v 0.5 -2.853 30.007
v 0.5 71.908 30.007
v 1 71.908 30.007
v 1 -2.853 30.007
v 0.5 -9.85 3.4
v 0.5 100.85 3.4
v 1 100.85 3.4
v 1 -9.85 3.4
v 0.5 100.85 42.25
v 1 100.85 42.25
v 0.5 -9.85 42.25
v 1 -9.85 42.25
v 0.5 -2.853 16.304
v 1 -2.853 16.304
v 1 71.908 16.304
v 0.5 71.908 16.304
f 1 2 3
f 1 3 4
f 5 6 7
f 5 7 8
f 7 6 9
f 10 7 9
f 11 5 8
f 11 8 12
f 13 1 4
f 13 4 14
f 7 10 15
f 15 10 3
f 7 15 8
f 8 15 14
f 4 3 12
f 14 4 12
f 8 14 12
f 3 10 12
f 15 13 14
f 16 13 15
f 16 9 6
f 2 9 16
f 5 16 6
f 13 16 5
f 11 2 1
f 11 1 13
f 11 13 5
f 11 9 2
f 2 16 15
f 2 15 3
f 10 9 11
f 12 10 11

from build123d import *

# Parameters (mm, degrees)
SKETCH_1_W          = 110.7
SKETCH_1_H          = 38.85
EXTRUDE_1_DEPTH     = 0.5
CUT_EXTRUDE_1_DEPTH = 110.343655509


with BuildPart() as part:
    # Эскиз1 → Бобышка-Вытянуть1 (new body)
    with BuildSketch(Plane(origin=(0.5, 0, 0), x_dir=(0, -1, 0), z_dir=(-1, 0, 0))):
        with Locations((-45.5, 22.825)):
            Rectangle(SKETCH_1_W, SKETCH_1_H)
    extrude(amount=-EXTRUDE_1_DEPTH)

    # Эскиз3 → Вырез-Вытянуть1 (cut, through all)
    with BuildSketch(Plane.ZY.offset(-0.5)):
        Polygon((30.006561442, -2.853434514), (16.303695676, -2.853435113), (16.303695676, 71.907533256), (30.006561442, 71.907533256), align=None)
    extrude(amount=-CUT_EXTRUDE_1_DEPTH, mode=Mode.SUBTRACT)


solid = part.part
